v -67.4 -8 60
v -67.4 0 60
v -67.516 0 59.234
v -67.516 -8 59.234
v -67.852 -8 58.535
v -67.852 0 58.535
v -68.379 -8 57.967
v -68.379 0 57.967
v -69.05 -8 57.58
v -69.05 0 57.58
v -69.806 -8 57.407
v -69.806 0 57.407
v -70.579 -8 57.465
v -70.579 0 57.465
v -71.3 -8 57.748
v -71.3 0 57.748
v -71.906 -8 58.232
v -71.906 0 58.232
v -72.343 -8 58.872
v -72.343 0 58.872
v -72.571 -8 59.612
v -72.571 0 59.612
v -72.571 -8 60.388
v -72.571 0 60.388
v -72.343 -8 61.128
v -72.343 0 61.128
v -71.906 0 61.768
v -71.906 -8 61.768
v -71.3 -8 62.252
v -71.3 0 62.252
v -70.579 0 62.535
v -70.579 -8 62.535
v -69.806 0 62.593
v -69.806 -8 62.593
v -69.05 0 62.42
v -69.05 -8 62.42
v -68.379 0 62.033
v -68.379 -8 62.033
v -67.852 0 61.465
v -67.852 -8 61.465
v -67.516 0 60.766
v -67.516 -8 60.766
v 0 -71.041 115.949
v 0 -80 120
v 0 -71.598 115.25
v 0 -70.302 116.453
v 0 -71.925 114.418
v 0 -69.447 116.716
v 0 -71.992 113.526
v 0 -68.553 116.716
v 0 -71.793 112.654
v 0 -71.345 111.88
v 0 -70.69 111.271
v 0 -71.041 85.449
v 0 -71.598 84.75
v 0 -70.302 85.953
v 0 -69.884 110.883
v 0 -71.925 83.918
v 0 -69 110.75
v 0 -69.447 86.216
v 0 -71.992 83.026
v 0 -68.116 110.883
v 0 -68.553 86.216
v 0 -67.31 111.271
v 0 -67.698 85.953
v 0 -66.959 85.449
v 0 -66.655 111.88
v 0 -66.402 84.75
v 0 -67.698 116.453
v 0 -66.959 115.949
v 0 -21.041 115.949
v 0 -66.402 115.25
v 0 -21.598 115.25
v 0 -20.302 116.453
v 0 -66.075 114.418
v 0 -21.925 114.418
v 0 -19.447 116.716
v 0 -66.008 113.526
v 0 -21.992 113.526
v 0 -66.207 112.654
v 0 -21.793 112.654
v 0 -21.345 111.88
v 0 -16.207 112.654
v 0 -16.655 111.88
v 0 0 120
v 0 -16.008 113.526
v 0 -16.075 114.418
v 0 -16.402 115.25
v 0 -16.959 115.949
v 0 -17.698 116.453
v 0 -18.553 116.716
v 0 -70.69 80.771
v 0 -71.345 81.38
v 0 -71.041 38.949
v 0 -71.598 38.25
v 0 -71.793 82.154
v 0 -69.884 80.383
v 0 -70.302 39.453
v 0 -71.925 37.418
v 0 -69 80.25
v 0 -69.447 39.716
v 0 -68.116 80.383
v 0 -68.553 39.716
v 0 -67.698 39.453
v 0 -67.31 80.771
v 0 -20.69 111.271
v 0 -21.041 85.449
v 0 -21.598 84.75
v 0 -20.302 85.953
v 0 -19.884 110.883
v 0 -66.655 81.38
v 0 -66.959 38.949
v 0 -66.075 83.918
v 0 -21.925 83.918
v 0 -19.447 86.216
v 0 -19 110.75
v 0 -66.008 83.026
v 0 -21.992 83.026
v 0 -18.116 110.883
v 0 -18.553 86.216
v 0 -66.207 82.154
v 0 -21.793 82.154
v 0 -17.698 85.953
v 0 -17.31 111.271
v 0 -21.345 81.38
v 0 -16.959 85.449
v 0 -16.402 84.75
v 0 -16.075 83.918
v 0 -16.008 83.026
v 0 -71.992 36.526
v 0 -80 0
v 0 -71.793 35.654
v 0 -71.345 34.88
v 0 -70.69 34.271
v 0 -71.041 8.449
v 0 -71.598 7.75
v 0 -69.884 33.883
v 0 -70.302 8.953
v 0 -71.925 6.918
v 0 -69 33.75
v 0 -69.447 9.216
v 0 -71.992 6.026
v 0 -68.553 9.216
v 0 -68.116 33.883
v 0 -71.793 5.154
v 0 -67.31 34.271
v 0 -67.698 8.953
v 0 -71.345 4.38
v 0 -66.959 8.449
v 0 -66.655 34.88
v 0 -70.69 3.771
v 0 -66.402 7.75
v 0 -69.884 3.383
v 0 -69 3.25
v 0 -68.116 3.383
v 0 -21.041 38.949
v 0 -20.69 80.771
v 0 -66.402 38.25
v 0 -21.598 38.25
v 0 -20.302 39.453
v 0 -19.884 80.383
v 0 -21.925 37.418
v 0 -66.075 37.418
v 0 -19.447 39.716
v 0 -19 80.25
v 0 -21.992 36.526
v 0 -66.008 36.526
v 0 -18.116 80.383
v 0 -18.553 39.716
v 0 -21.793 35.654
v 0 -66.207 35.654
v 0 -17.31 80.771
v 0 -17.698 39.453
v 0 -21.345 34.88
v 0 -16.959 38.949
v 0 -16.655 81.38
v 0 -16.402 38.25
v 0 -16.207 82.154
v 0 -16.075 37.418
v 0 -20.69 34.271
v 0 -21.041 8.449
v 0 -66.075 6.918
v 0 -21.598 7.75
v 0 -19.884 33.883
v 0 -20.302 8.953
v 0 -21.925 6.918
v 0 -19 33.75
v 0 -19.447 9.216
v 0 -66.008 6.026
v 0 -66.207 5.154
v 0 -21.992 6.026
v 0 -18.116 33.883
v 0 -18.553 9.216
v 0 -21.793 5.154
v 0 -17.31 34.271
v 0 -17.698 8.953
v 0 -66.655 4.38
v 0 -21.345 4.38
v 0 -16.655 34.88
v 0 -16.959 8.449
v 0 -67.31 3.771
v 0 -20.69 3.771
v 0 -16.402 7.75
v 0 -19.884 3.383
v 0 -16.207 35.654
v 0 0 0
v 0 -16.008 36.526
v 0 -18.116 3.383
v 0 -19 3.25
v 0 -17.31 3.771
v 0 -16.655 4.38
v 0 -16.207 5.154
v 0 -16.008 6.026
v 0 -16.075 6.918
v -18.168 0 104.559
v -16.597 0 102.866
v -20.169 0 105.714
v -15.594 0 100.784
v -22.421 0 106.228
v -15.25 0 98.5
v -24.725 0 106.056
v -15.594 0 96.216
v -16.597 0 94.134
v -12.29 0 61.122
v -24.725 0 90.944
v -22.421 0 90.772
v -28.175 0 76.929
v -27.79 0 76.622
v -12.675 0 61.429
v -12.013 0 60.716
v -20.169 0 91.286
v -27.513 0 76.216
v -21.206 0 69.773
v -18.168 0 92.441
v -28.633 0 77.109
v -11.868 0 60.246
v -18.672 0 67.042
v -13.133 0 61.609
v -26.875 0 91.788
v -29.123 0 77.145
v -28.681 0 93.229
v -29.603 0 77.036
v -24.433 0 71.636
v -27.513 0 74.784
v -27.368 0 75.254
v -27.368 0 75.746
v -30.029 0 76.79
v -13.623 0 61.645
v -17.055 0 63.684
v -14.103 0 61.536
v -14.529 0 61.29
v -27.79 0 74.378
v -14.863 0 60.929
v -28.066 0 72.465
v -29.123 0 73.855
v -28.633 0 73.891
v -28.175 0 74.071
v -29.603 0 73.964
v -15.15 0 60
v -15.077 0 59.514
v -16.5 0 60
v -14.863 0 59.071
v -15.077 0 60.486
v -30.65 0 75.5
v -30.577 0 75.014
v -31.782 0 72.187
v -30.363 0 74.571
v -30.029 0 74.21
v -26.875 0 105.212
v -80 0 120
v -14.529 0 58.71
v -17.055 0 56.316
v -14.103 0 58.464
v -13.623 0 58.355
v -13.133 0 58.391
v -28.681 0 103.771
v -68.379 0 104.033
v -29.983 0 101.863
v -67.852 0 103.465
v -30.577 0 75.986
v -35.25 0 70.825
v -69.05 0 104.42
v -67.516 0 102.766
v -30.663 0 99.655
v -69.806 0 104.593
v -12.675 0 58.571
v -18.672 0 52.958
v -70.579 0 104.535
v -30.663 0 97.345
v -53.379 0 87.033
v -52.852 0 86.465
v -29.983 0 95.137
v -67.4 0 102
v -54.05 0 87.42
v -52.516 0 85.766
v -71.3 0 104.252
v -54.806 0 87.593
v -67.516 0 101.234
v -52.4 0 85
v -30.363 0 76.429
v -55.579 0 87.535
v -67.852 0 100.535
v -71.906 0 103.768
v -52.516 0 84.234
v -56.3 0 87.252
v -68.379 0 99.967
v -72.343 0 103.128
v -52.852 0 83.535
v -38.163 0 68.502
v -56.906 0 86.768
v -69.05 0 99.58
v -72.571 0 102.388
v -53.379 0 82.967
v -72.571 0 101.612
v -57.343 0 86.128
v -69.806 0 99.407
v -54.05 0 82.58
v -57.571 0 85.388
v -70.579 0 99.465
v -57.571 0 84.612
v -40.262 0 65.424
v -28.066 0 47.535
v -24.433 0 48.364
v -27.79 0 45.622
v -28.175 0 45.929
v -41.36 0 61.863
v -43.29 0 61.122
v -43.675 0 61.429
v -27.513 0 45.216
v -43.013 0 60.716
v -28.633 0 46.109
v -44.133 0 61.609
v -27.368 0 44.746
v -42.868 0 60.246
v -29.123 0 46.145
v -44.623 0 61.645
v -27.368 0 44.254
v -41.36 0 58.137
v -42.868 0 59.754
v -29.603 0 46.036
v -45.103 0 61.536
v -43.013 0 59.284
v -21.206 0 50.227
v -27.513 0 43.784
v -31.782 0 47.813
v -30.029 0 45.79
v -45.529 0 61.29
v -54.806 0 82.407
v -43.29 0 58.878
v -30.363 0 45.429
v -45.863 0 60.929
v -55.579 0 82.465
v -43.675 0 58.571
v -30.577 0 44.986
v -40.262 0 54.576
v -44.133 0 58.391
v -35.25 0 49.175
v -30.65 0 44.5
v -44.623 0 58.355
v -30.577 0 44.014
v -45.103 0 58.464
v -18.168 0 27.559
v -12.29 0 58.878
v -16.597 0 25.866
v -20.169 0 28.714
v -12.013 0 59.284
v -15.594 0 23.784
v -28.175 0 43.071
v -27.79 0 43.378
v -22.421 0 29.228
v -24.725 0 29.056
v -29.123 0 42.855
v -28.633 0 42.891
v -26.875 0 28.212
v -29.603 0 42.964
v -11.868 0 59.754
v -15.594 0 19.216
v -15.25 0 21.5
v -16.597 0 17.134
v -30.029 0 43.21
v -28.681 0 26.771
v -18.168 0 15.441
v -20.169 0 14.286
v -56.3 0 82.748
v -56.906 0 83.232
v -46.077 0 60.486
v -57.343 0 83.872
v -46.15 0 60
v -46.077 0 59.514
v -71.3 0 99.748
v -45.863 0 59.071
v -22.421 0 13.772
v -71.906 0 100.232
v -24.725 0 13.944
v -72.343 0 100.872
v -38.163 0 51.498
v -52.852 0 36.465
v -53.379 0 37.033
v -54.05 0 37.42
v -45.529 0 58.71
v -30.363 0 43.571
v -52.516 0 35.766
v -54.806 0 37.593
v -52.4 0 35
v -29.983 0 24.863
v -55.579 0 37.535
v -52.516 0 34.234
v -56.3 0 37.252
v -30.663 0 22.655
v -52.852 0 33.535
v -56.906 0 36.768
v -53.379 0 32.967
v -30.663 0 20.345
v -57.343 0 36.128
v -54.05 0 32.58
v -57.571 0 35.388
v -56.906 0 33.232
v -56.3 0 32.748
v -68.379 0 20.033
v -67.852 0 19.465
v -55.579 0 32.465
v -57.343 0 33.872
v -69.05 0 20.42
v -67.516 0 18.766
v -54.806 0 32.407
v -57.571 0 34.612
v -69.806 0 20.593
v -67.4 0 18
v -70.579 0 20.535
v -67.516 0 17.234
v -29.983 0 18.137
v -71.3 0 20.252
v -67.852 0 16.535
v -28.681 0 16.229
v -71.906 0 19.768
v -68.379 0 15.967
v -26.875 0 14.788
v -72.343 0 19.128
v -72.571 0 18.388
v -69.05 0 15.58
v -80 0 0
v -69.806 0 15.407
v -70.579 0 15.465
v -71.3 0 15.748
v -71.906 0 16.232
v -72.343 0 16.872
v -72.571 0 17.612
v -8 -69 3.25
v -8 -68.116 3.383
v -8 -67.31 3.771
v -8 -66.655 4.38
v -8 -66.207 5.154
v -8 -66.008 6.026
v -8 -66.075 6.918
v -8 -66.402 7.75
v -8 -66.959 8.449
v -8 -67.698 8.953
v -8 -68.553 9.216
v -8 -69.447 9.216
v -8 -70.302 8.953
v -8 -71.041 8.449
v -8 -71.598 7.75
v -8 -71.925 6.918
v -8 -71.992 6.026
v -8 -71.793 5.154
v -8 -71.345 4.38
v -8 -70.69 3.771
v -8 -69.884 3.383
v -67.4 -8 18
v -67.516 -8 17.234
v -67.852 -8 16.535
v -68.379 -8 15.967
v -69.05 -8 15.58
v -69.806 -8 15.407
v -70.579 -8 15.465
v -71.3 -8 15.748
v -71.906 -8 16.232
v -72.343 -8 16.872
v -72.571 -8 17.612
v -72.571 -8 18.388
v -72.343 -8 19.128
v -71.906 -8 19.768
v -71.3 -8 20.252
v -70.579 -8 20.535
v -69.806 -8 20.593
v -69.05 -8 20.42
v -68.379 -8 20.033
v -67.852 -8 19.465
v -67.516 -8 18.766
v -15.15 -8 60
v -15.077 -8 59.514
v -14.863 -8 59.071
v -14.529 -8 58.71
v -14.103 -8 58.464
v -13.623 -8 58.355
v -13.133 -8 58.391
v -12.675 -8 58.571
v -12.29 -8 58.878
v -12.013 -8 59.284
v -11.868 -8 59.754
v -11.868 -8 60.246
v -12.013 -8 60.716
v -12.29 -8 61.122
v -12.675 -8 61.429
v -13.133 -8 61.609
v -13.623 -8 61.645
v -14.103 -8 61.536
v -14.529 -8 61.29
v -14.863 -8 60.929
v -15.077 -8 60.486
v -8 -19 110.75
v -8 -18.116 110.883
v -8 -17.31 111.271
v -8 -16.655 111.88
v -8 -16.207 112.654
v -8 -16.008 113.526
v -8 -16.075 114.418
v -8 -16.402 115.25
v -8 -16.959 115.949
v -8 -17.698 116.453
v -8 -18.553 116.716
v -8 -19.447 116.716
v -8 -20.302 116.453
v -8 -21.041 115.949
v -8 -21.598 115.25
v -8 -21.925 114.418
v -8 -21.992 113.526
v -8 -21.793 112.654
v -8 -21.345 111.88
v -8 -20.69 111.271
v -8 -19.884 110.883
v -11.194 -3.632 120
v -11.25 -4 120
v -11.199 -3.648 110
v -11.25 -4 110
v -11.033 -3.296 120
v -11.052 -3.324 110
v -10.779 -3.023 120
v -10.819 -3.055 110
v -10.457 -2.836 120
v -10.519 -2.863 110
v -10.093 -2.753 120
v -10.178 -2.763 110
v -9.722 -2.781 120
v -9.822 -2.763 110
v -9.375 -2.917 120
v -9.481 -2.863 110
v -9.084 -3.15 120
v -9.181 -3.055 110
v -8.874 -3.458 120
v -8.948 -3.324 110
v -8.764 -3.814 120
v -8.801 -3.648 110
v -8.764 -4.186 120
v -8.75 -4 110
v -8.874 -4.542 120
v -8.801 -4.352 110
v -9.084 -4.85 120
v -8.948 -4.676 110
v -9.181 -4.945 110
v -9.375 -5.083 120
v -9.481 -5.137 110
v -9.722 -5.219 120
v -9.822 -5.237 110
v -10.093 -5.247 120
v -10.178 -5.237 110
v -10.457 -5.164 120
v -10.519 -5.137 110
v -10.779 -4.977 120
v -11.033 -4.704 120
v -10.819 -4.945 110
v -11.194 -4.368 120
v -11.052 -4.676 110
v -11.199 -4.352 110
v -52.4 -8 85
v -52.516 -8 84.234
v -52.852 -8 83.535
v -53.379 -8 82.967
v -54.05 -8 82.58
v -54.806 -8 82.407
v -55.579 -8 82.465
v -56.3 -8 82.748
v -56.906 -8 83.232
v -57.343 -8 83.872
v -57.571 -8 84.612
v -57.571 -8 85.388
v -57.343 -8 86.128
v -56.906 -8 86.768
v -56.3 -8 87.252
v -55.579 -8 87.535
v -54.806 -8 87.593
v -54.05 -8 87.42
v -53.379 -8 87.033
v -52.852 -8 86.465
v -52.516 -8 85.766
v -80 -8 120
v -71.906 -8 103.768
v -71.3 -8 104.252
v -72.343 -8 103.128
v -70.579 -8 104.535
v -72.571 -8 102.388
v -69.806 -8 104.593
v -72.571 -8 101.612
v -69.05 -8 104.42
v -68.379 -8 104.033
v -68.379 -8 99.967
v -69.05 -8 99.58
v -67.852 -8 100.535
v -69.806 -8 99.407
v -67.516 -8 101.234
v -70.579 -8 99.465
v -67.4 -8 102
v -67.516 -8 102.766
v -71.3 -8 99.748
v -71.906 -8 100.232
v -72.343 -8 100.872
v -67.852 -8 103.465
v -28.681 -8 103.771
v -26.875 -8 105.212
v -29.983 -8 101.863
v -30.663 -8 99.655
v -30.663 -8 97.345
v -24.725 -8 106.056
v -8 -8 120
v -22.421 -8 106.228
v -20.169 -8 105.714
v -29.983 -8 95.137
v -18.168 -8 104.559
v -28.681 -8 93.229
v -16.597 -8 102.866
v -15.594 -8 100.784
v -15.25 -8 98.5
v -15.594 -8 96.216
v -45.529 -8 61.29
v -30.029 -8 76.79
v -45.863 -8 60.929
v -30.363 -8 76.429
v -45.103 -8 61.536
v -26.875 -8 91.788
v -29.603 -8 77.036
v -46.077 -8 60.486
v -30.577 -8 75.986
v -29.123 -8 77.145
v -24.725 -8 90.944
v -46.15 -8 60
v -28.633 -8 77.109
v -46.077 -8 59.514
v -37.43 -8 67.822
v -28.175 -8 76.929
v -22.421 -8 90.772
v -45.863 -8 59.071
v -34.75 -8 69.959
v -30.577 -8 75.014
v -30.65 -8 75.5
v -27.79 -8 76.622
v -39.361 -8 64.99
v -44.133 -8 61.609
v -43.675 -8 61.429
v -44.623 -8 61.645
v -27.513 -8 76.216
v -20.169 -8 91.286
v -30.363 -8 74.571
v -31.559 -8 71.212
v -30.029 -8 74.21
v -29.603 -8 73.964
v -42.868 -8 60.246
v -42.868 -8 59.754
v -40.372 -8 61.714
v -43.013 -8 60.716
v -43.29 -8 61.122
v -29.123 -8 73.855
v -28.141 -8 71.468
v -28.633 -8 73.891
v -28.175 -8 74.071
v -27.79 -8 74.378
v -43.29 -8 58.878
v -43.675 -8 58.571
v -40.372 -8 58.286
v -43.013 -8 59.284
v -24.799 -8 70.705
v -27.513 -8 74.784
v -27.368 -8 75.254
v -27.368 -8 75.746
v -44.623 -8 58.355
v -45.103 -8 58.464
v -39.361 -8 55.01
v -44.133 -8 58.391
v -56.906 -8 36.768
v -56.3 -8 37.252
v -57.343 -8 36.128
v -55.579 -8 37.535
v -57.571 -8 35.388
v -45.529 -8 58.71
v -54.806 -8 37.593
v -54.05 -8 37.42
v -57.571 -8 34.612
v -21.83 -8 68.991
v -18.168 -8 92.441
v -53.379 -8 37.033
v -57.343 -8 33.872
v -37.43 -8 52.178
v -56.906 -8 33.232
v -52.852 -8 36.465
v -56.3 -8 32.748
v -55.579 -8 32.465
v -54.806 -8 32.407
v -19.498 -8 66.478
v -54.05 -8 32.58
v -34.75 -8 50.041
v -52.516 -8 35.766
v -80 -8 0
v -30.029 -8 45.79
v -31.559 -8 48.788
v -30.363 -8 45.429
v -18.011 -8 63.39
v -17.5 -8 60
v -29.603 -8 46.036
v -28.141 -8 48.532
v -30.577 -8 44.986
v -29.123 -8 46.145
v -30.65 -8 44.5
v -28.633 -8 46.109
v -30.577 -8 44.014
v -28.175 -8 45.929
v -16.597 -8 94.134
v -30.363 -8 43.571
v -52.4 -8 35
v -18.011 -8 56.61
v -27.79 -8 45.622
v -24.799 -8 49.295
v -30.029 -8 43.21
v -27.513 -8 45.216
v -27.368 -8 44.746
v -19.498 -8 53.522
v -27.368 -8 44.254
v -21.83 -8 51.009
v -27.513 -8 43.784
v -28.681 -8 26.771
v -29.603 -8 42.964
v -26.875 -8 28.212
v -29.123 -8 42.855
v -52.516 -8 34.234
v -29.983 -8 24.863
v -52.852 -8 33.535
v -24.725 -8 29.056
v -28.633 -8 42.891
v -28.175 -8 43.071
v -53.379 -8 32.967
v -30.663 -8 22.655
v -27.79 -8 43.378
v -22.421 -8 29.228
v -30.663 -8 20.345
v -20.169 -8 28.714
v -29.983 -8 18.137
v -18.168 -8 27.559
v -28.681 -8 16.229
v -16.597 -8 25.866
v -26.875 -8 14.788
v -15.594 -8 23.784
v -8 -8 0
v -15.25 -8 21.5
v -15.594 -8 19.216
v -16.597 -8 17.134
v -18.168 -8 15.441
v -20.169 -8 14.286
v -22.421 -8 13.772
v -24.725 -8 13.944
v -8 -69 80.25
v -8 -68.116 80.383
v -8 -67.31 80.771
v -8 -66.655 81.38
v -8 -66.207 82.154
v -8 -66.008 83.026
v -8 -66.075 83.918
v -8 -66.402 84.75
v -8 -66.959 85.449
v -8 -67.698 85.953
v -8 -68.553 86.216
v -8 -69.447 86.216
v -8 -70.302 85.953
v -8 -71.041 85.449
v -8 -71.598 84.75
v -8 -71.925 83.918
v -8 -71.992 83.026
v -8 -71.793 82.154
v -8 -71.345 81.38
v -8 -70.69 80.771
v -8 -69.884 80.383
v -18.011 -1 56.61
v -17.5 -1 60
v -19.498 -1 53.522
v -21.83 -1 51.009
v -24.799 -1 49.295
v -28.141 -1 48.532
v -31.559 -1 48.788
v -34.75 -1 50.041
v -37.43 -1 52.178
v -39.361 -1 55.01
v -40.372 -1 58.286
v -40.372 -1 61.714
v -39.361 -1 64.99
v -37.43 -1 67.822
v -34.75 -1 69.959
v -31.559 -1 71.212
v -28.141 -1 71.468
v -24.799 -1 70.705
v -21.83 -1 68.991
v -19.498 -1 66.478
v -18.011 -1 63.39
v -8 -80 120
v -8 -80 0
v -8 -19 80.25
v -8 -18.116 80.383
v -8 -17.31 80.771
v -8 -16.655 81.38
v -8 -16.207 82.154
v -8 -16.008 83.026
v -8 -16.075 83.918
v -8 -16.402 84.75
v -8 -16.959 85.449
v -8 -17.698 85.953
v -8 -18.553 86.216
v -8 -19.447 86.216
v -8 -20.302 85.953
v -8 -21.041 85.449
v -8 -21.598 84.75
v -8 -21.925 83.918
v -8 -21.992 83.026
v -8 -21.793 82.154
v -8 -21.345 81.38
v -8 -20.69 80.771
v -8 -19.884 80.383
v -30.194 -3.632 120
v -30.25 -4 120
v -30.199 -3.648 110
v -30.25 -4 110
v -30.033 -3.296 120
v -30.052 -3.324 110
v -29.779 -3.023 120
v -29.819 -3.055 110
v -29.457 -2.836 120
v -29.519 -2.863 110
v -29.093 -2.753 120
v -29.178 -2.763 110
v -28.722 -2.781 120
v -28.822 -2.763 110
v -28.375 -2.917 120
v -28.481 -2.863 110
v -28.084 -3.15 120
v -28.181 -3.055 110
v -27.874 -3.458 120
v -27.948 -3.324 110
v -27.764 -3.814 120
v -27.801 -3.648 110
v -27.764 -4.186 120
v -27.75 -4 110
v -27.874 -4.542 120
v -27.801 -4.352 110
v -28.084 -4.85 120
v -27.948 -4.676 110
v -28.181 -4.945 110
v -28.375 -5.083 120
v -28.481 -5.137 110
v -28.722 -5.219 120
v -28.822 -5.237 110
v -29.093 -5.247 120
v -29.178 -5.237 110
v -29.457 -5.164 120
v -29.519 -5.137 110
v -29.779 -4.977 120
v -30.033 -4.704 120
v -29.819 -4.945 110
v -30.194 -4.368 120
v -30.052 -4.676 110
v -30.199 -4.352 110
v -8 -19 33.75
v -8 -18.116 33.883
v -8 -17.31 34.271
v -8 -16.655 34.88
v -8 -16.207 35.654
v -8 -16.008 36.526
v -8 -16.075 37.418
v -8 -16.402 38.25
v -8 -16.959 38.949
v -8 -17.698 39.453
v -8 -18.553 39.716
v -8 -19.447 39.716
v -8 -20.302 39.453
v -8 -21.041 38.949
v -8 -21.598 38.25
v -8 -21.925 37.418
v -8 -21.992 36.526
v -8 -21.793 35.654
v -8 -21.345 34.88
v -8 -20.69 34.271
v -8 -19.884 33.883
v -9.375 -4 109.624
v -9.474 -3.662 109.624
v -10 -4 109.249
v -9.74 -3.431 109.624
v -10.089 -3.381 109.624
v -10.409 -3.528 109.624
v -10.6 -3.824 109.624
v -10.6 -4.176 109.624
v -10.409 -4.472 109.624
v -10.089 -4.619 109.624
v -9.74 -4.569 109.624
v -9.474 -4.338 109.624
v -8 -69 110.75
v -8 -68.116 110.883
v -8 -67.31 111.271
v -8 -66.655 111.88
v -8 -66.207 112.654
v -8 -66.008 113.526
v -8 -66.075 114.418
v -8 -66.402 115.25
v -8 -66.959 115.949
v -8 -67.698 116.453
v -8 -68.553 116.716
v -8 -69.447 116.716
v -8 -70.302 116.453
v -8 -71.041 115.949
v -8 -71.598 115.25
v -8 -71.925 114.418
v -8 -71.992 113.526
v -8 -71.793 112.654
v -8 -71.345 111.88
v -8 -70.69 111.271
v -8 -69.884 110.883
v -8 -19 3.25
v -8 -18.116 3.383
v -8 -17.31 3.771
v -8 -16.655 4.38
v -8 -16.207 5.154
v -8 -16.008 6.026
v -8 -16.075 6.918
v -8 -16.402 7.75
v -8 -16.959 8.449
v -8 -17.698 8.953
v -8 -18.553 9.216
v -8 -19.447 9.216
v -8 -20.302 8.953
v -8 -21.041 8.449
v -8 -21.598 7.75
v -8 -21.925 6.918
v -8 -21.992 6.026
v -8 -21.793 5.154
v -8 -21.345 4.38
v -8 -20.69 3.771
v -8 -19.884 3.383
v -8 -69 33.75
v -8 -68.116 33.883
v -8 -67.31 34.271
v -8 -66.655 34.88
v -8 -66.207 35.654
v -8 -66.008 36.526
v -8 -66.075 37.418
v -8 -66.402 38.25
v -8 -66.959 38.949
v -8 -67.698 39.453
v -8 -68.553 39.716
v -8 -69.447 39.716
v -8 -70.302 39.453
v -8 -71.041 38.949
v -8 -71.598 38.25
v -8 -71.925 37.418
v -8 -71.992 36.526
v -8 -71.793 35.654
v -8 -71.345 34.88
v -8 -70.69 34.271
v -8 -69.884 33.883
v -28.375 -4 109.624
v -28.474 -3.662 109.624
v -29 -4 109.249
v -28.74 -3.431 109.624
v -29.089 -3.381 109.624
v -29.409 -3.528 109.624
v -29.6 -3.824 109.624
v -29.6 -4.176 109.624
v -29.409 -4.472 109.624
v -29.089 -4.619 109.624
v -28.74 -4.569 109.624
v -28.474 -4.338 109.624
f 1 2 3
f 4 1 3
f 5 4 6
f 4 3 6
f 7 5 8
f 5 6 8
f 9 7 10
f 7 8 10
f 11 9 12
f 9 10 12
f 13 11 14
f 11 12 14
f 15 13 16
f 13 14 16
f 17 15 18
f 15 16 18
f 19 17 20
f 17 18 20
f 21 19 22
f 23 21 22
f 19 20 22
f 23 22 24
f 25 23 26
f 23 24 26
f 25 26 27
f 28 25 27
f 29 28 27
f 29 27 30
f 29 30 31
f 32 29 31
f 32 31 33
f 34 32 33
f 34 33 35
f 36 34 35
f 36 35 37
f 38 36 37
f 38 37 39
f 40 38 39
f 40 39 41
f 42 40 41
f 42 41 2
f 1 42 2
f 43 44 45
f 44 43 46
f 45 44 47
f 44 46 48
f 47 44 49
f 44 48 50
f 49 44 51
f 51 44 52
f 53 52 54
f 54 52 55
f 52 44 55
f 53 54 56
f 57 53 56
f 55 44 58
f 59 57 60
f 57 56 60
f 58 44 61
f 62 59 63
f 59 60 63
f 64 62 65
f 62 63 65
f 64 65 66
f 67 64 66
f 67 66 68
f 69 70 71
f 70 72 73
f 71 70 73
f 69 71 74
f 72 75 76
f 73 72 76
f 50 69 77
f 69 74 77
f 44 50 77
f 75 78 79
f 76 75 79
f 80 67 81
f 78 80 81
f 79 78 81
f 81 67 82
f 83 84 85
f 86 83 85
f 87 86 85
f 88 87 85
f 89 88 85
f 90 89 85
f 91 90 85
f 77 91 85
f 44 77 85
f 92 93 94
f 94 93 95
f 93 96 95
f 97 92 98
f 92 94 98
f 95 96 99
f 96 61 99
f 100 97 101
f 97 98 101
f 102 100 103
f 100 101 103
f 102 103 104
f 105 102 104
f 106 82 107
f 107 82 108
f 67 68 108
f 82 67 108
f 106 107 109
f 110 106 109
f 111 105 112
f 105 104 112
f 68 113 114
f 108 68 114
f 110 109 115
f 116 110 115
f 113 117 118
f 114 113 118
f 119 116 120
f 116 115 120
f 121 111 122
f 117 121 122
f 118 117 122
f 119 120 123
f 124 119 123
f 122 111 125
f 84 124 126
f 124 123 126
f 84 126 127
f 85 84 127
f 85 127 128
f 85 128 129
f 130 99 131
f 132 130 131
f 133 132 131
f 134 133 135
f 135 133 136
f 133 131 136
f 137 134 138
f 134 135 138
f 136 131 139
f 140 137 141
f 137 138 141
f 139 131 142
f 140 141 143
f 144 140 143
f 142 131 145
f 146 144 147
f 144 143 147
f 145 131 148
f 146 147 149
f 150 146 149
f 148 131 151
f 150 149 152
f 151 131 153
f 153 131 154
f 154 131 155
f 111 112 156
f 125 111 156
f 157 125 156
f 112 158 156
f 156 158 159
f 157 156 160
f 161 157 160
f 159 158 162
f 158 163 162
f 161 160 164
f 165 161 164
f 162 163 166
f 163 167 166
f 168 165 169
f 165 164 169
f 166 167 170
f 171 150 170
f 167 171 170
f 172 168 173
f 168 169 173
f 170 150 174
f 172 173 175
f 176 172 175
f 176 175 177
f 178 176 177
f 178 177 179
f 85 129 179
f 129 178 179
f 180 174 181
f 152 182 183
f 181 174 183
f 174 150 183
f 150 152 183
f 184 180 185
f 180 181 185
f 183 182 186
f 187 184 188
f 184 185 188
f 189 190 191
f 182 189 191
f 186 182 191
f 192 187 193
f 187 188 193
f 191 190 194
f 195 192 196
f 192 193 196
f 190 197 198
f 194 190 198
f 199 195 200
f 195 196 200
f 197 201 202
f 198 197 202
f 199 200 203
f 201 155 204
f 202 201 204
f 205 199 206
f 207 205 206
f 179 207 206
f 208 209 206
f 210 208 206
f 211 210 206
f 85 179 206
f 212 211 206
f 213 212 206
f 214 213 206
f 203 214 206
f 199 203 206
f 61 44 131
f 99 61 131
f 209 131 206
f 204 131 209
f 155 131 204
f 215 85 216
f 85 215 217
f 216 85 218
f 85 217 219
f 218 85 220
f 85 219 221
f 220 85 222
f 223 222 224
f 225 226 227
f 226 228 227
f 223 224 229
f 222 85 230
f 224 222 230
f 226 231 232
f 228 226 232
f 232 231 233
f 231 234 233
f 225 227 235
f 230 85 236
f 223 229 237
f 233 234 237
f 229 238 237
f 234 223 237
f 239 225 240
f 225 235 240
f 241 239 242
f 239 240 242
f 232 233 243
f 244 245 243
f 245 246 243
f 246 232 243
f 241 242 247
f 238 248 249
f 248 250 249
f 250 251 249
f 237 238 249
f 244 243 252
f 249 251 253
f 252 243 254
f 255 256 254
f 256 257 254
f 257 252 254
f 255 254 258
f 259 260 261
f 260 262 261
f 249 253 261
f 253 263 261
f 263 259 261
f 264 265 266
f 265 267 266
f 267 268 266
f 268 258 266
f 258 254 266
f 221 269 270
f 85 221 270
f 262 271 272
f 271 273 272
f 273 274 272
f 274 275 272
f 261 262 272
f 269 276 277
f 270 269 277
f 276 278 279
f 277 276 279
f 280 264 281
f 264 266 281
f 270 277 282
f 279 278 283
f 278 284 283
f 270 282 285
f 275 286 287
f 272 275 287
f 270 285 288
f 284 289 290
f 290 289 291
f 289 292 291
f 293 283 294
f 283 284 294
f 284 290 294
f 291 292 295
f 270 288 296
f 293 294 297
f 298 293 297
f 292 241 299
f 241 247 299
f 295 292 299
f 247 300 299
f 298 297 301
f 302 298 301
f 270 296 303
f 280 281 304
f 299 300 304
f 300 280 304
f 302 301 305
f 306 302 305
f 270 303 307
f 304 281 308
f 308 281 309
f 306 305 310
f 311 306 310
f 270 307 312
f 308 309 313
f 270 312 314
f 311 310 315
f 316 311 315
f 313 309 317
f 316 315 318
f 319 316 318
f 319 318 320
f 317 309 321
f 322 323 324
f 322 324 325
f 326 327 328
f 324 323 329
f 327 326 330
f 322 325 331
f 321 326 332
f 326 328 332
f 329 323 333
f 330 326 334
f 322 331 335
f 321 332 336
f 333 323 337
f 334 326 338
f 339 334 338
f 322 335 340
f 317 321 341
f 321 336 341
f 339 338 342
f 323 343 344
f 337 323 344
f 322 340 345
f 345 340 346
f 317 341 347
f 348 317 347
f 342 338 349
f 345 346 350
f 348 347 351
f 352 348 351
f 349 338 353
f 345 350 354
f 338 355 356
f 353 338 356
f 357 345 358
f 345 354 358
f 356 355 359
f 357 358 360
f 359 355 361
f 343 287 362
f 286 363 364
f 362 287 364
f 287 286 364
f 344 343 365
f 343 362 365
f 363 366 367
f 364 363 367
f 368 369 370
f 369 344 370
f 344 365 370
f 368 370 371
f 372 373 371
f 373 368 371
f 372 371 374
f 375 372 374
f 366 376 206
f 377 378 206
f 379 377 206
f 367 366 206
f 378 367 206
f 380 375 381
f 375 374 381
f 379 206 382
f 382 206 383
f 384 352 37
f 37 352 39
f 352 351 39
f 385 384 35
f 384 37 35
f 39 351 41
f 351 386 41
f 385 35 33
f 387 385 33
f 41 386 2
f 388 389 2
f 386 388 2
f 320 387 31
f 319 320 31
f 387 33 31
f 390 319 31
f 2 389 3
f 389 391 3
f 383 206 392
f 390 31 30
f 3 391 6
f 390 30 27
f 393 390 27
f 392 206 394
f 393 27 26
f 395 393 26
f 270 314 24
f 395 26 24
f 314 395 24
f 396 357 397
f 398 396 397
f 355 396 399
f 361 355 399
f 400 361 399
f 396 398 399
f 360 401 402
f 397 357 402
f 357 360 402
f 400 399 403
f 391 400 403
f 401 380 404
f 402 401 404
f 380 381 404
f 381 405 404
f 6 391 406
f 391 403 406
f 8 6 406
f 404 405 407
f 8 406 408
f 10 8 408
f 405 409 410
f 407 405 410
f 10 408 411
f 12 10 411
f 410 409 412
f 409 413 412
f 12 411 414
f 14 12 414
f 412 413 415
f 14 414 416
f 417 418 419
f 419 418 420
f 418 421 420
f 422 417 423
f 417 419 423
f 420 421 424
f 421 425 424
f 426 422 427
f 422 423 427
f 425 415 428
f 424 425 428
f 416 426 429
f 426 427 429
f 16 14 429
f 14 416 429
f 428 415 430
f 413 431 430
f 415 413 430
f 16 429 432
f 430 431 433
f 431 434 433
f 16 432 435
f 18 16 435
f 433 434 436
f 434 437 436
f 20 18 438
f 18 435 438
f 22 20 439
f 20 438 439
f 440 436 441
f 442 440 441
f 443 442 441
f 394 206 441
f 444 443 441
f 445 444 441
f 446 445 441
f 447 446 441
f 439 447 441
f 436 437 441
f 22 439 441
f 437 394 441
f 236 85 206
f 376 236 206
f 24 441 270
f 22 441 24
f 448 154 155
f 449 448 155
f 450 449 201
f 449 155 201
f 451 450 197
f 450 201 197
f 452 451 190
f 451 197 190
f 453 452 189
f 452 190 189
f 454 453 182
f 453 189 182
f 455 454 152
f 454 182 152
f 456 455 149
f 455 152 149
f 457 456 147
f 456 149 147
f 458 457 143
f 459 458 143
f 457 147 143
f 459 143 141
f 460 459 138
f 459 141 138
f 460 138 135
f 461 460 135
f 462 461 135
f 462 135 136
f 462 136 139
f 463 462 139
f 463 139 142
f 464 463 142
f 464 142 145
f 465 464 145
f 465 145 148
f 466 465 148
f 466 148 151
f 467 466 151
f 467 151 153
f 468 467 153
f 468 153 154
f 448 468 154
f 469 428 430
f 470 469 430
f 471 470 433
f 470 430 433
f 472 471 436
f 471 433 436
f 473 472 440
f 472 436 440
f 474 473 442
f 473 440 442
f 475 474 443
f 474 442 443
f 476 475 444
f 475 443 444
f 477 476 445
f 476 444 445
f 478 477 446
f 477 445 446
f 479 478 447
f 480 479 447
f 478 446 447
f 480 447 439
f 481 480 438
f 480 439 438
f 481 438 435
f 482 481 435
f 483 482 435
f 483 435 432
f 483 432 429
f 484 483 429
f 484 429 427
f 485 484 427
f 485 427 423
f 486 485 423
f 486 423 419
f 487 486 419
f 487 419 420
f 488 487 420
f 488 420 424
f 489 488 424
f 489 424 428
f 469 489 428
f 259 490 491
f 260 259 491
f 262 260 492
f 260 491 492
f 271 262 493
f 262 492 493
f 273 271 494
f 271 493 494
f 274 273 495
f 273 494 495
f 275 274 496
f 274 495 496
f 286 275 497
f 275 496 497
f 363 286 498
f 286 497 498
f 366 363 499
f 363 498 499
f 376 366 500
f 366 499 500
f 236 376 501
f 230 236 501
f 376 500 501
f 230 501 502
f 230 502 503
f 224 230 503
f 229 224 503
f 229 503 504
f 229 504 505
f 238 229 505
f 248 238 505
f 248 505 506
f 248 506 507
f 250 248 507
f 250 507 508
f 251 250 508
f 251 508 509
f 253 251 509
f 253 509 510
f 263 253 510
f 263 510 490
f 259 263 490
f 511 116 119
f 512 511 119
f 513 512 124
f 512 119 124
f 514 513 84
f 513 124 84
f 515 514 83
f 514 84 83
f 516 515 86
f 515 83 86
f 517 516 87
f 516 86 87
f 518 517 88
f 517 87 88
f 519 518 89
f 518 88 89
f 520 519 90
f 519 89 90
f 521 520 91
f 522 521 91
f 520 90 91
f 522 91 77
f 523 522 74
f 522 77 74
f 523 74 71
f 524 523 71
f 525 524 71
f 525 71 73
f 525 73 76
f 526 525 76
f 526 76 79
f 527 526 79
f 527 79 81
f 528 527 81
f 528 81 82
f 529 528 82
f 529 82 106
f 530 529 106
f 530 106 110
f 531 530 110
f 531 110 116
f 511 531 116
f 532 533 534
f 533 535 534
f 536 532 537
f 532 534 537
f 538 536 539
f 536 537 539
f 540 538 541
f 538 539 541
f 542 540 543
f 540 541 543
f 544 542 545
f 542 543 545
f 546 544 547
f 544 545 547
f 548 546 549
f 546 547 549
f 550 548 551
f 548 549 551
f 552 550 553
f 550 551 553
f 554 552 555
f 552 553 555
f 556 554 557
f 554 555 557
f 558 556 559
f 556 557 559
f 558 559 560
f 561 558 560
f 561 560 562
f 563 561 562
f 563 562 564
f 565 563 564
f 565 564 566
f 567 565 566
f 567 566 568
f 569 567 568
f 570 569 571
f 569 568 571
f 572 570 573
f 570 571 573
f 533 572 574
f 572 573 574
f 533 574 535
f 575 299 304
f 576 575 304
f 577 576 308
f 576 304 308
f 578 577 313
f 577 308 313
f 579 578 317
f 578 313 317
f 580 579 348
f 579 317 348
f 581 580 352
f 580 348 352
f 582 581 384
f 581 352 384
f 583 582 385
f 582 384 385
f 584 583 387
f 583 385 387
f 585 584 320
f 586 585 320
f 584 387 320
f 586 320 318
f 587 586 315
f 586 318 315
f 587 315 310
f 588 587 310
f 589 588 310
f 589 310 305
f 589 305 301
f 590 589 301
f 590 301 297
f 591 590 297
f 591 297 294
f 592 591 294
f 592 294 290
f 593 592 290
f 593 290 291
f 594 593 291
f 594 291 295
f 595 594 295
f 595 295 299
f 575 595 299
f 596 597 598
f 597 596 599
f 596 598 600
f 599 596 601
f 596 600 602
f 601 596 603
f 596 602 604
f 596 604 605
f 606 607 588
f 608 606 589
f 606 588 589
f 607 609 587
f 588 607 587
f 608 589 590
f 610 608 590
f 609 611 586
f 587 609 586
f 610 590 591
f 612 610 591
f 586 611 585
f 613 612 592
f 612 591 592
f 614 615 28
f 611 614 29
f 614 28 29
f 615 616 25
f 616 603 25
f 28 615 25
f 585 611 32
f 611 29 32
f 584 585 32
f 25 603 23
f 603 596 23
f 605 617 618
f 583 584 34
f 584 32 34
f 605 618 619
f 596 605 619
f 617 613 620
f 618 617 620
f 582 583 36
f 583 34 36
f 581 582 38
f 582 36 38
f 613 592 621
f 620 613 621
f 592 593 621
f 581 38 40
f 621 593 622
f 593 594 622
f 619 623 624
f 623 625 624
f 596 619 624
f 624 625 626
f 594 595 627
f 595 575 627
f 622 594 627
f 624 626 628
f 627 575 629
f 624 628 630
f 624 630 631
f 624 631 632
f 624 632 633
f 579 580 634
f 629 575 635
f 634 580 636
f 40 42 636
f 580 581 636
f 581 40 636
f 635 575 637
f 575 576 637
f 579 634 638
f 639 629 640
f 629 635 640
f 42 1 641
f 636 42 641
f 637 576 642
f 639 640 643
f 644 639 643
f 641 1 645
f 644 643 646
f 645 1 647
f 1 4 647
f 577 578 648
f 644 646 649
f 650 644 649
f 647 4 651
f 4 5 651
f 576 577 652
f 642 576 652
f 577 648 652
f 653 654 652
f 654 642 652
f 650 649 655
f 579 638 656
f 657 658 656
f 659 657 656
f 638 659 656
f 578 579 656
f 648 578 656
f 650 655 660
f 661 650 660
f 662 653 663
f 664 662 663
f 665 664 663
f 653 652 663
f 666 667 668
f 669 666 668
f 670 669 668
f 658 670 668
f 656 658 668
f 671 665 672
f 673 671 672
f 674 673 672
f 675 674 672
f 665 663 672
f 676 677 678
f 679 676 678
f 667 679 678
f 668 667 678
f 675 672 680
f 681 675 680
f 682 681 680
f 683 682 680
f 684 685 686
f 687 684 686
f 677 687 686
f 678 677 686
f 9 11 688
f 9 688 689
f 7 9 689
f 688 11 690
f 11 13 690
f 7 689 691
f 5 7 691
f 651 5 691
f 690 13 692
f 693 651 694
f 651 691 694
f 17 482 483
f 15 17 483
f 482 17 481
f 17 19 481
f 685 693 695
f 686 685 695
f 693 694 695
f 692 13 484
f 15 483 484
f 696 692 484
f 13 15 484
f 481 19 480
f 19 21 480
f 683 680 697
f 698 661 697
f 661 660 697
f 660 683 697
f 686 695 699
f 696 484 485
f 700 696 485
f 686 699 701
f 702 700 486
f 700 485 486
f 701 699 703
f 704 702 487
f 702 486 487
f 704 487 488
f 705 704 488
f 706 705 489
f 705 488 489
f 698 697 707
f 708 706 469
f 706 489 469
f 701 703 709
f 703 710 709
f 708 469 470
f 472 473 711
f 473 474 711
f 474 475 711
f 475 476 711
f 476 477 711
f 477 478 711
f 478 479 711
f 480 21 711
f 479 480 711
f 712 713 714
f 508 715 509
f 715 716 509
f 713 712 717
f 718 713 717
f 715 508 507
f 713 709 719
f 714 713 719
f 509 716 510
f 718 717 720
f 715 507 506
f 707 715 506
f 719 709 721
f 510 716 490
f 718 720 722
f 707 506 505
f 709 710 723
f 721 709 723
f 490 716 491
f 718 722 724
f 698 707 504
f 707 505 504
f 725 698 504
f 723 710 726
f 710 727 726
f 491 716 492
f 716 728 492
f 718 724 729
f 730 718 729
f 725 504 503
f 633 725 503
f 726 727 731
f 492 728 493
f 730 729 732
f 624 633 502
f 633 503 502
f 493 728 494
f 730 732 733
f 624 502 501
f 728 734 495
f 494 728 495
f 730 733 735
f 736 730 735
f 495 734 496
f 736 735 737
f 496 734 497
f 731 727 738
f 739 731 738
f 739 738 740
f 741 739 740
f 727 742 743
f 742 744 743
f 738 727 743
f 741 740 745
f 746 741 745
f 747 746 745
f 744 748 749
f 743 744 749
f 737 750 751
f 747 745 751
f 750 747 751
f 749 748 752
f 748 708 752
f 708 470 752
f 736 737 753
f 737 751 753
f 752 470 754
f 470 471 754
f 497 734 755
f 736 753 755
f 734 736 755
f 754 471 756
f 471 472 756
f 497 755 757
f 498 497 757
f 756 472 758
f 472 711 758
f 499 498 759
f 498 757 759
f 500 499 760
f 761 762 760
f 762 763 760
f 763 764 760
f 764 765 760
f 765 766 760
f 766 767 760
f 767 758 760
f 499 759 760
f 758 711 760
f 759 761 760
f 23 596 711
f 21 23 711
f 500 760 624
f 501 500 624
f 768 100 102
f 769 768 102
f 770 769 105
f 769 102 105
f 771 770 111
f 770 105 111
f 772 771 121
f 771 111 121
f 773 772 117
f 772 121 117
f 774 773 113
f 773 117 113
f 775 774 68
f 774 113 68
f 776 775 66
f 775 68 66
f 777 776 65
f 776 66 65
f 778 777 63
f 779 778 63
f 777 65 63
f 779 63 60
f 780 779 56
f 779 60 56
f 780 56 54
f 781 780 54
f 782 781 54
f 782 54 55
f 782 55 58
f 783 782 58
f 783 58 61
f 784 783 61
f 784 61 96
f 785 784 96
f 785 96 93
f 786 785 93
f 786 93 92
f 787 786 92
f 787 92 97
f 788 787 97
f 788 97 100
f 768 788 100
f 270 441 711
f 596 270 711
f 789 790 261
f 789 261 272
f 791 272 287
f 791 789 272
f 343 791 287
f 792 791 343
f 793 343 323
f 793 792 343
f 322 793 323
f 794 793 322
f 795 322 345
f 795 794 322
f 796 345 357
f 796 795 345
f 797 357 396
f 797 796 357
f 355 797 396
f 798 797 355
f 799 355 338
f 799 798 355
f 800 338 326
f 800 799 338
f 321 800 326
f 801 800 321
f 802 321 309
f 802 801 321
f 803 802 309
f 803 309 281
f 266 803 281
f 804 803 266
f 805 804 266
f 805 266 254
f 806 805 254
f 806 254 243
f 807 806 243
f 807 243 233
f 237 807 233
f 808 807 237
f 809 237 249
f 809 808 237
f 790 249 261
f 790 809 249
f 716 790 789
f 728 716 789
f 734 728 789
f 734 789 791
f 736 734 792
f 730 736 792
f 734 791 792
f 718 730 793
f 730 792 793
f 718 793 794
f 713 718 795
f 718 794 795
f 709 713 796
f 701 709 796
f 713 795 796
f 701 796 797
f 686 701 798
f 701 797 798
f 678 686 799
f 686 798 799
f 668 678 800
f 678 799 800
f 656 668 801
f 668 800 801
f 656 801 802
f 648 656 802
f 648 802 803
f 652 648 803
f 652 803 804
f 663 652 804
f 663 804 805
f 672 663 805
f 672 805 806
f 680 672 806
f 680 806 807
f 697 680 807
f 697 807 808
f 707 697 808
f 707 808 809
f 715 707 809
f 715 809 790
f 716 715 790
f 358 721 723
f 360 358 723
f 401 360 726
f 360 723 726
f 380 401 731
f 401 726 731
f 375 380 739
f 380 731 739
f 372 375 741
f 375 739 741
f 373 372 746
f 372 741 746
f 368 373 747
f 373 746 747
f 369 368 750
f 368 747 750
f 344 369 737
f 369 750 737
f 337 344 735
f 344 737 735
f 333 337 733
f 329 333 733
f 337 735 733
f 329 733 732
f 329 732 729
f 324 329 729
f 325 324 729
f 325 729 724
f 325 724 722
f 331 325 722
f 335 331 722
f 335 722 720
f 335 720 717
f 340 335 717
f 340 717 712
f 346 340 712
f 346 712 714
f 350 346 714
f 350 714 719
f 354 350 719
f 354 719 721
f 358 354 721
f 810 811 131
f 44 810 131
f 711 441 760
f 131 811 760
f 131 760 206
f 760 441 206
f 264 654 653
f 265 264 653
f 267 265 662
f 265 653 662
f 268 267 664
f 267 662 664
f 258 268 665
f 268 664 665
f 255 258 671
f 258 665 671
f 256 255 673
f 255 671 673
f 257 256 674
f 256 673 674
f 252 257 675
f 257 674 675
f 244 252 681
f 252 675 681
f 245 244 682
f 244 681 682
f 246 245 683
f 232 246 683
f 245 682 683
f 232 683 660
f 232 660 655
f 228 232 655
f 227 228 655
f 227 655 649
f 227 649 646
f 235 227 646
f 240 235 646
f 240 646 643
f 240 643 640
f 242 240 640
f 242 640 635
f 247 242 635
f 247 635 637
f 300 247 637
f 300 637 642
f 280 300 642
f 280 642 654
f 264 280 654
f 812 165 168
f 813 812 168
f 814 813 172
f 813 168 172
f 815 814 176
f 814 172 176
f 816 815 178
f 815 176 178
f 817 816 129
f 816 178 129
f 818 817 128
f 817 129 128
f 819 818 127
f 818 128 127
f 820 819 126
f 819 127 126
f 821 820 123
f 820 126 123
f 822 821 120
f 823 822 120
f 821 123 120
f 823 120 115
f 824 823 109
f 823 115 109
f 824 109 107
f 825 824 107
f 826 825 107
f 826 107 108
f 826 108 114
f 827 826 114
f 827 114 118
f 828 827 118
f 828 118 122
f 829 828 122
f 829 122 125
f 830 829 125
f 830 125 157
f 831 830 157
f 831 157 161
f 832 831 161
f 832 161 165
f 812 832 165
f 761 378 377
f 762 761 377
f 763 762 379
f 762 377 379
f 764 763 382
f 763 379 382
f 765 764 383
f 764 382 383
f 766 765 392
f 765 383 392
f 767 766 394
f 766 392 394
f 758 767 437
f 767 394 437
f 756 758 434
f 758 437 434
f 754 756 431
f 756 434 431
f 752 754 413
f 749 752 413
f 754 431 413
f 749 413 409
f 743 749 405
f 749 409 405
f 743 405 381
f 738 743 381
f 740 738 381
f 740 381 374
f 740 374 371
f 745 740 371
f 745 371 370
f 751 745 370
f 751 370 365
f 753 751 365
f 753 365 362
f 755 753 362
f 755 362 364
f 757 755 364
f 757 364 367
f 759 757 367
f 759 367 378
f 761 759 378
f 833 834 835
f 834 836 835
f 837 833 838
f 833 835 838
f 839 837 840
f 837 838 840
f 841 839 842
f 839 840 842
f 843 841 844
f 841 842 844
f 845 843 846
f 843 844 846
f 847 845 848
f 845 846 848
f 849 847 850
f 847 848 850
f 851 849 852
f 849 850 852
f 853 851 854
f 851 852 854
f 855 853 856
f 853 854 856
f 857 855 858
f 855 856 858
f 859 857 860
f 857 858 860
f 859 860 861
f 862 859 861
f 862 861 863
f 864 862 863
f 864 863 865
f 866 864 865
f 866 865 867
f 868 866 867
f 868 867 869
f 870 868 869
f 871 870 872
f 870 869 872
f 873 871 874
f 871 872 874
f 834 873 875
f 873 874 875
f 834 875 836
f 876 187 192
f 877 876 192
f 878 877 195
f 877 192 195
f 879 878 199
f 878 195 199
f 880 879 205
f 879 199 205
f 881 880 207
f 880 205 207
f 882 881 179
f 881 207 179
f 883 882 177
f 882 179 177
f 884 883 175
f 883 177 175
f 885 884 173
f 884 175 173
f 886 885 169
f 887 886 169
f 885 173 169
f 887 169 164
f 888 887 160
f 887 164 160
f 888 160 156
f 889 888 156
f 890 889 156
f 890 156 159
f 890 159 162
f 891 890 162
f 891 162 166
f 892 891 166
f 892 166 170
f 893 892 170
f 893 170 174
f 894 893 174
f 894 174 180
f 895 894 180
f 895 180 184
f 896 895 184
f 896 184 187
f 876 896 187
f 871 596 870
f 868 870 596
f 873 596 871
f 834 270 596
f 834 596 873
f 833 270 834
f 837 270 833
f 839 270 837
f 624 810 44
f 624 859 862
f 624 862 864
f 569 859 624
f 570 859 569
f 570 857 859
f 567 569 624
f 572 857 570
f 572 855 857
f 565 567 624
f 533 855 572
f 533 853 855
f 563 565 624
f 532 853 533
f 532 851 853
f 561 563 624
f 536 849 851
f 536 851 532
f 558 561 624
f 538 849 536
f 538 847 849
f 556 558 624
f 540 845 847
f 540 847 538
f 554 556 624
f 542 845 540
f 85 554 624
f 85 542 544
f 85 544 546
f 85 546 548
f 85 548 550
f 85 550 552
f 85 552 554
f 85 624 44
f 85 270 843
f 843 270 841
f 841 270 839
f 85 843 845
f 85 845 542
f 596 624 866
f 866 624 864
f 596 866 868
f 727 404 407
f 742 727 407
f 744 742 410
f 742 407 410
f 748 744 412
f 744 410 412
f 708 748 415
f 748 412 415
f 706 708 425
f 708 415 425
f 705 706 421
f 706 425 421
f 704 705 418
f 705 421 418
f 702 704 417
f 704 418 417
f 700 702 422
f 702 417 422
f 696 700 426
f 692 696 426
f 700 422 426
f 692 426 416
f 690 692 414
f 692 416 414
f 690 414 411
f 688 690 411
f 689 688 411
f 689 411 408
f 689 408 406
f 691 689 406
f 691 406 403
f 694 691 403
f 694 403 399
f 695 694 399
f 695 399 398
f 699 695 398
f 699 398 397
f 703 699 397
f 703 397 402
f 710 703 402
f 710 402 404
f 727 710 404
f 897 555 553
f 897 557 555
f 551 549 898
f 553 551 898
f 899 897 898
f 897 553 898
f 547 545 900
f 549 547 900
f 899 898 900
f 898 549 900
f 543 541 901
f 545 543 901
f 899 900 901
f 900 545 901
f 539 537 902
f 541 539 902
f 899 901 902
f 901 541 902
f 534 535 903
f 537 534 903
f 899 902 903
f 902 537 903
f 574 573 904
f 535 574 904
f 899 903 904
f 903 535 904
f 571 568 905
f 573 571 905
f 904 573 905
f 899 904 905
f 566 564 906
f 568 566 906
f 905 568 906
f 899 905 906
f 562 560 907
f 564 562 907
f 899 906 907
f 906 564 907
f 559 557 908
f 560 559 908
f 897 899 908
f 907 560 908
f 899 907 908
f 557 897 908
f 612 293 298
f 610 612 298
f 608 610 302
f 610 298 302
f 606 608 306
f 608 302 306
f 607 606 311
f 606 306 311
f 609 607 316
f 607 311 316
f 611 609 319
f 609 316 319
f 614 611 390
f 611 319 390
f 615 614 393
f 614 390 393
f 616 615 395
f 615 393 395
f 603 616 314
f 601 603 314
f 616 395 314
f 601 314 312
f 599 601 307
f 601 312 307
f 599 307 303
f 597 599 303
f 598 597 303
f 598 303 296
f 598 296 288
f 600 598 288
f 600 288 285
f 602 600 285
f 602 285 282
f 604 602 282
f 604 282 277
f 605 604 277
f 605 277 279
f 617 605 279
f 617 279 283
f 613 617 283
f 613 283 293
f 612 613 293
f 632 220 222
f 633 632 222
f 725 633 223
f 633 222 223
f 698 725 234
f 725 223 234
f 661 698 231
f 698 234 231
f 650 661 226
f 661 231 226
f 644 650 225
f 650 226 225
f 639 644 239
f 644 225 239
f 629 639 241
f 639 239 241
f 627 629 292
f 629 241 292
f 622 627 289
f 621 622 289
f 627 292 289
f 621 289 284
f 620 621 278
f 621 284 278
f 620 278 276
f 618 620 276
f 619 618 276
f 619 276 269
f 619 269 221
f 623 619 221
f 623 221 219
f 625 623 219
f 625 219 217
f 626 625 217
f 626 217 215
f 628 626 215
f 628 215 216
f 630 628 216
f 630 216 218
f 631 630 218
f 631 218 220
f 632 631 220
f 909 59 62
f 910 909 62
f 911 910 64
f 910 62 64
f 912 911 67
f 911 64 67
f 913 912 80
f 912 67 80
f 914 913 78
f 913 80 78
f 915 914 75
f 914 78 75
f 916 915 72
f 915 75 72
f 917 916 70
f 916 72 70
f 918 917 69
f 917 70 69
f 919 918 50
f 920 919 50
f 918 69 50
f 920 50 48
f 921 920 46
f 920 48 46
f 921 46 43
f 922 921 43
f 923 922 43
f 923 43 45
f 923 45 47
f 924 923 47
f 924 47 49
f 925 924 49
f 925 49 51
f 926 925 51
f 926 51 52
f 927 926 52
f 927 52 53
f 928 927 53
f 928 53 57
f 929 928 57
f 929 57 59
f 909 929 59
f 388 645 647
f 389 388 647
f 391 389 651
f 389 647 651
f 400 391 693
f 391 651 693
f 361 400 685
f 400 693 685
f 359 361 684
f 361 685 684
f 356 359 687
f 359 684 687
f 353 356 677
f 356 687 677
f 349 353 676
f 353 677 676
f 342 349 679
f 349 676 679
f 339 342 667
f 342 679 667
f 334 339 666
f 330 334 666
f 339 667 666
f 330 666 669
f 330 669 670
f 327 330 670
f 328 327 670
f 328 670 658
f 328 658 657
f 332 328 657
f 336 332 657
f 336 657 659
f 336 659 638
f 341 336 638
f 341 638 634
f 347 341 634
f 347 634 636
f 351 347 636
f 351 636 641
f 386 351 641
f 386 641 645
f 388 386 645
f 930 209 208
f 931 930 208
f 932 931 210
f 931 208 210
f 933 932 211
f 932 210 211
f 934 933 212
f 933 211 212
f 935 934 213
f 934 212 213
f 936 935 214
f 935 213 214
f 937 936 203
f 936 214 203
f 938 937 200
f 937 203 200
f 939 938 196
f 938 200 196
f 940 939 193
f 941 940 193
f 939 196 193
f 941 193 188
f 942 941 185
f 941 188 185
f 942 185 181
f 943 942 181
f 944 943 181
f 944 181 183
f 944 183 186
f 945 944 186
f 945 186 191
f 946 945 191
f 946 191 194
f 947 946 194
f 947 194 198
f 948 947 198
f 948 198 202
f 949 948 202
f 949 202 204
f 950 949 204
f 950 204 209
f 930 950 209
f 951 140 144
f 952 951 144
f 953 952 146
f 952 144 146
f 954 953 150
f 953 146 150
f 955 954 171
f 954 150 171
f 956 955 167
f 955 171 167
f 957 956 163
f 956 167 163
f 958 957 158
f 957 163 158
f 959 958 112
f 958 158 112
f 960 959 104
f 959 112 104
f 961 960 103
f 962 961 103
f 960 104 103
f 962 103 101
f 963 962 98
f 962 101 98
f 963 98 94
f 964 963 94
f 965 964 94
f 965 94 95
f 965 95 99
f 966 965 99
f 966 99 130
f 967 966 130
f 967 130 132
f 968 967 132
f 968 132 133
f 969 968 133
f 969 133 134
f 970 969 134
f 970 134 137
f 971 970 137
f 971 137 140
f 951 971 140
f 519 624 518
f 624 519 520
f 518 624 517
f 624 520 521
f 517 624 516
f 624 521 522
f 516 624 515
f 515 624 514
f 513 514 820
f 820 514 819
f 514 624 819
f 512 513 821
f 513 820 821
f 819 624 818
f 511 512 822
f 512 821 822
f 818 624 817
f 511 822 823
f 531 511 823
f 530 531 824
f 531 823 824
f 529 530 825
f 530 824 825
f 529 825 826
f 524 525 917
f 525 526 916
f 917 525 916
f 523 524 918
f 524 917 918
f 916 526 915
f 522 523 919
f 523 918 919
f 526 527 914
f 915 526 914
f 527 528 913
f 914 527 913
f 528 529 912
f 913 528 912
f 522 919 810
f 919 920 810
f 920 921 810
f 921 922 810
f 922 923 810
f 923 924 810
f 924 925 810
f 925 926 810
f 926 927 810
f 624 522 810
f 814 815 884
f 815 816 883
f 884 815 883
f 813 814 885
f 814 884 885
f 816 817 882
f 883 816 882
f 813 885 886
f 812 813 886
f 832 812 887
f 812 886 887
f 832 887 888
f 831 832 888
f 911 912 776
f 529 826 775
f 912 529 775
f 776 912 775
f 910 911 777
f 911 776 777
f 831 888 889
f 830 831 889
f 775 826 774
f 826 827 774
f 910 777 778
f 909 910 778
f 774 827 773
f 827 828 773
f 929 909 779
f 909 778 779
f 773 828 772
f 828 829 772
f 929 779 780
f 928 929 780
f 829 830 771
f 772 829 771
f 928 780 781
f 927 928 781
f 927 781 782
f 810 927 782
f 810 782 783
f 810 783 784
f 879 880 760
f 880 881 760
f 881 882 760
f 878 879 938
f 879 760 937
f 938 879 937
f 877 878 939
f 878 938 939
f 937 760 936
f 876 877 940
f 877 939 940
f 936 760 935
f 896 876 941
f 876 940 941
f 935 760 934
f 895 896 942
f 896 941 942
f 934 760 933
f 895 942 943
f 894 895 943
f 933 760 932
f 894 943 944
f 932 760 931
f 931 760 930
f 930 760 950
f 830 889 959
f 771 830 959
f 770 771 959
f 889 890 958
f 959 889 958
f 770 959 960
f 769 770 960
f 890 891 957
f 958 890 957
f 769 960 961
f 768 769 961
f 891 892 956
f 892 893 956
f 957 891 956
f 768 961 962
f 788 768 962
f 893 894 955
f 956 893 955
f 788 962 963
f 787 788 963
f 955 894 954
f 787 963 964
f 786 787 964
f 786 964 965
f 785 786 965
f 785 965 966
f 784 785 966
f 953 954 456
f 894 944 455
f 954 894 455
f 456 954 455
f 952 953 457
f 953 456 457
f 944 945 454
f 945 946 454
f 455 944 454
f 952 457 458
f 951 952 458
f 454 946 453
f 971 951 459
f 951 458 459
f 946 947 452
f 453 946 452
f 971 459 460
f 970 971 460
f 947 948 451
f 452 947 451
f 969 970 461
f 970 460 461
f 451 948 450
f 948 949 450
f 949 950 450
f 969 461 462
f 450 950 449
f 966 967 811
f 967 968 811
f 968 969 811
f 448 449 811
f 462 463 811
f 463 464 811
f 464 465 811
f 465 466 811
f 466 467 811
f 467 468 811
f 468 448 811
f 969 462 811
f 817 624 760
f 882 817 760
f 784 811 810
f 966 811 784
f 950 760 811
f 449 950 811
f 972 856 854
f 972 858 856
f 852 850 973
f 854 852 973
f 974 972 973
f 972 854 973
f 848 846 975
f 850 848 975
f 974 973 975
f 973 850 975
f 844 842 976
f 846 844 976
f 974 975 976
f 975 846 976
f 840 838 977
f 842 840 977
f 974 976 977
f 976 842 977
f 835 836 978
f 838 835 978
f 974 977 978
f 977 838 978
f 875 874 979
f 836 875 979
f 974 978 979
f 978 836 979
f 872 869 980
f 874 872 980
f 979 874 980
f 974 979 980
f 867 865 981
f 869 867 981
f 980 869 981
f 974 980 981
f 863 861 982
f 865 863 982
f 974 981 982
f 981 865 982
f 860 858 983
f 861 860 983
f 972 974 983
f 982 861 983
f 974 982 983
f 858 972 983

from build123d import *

# Parameters (mm, degrees)
ESTRUSIONE_ESTRUSIONE1_DEPTH = 120
TAGLIO_ESTRUSIONE2_REACH     = 82
SCHIZZO6_R                   = 7.75
TAGLIO_ESTRUSIONE3_REACH     = 82
SCHIZZO7_R                   = 11.5
M4_TAPPED_HOLE1_D            = 3.3
SCHIZZO12_R                  = 3
TAGLIO_ESTRUSIONE4_DEPTH     = 10
SCHIZZO14_R                  = 2.6
TAGLIO_ESTRUSIONE5_DEPTH     = 10
SMUSSO2_SIZE                 = 1
FORO_FILETTATO_M3_1_D        = 2.5
FORO_FILETTATO_M3_1_DEPTH    = 10
FORO_FILETTATO_M3_1_TIP      = 0.751075774


with BuildPart() as part:
    # Schizzo1 → Estrusione-Estrusione1 (new body)
    with BuildSketch(Plane.XY):
        Polygon((0, 0), (-80, 0), (-80, -8), (-8, -8), (-8, -80), (0, -80), align=None)
    extrude(amount=ESTRUSIONE_ESTRUSIONE1_DEPTH)

    # Schizzo6 → Taglio-Estrusione2 (cut, up to next)
    with BuildSketch(Plane(origin=(0, 0, 0), x_dir=(1, 0, 0), z_dir=(0, 1, 0)), mode=Mode.PRIVATE) as taglio_estrusione2_sk1:
        with Locations((-23, -21.5)):
            Circle(SCHIZZO6_R)
    taglio_estrusione2_tool1 = extrude(taglio_estrusione2_sk1.sketch, amount=-TAGLIO_ESTRUSIONE2_REACH, mode=Mode.PRIVATE) & part.part
    add(taglio_estrusione2_tool1.solids().sort_by_distance((-23, 0, 21.5))[0], mode=Mode.SUBTRACT)
    # Schizzo6 → Taglio-Estrusione2 (cut, up to next)
    with BuildSketch(Plane(origin=(0, 0, 0), x_dir=(1, 0, 0), z_dir=(0, 1, 0)), mode=Mode.PRIVATE) as taglio_estrusione2_sk2:
        with Locations((-23, -98.5)):
            Circle(SCHIZZO6_R)
    taglio_estrusione2_tool2 = extrude(taglio_estrusione2_sk2.sketch, amount=-TAGLIO_ESTRUSIONE2_REACH, mode=Mode.PRIVATE) & part.part
    add(taglio_estrusione2_tool2.solids().sort_by_distance((-23, 0, 98.5))[0], mode=Mode.SUBTRACT)

    # Schizzo7 → Taglio-Estrusione3 (cut, up to next)
    with BuildSketch(Plane(origin=(0, 0, 0), x_dir=(1, 0, 0), z_dir=(0, 1, 0)), mode=Mode.PRIVATE) as taglio_estrusione3_sk1:
        with Locations((-29, -60)):
            Circle(SCHIZZO7_R)
    taglio_estrusione3_tool1 = extrude(taglio_estrusione3_sk1.sketch, amount=-TAGLIO_ESTRUSIONE3_REACH, mode=Mode.PRIVATE) & part.part
    add(taglio_estrusione3_tool1.solids().sort_by_distance((-29, 0, 60))[0], mode=Mode.SUBTRACT)

    # M4 Tapped Hole1 (through all)
    with Locations(Plane(origin=(0, 0, 0), x_dir=(1, 0, 0), z_dir=(0, 1, 0))):
        with Locations((-29, -44.5), (-44.5, -60), (-29, -75.5), (-13.5, -60), (-29, -60)):
            Hole(M4_TAPPED_HOLE1_D / 2)

    # Schizzo12 → Taglio-Estrusione4 (cut)
    with BuildSketch(Plane(origin=(0, 0, 0), x_dir=(0, 0, -1), z_dir=(1, 0, 0))):
        with Locations((-113.75, -19)):
            Circle(SCHIZZO12_R)
        with Locations((-83.25, -19)):
            Circle(SCHIZZO12_R)
        with Locations((-36.75, -19)):
            Circle(SCHIZZO12_R)
        with Locations((-6.25, -19)):
            Circle(SCHIZZO12_R)
        with Locations((-83.25, -69)):
            Circle(SCHIZZO12_R)
        with Locations((-113.75, -69)):
            Circle(SCHIZZO12_R)
        with Locations((-6.25, -69)):
            Circle(SCHIZZO12_R)
        with Locations((-36.75, -69)):
            Circle(SCHIZZO12_R)
    extrude(amount=-TAGLIO_ESTRUSIONE4_DEPTH, mode=Mode.SUBTRACT)

    # Schizzo14 → Taglio-Estrusione5 (cut)
    with BuildSketch(Plane(origin=(0, 0, 0), x_dir=(1, 0, 0), z_dir=(0, 1, 0))):
        with Locations((-70, -18)):
            Circle(SCHIZZO14_R)
        with Locations((-70, -60)):
            Circle(SCHIZZO14_R)
        with Locations((-70, -102)):
            Circle(SCHIZZO14_R)
        with Locations((-55, -35)):
            Circle(SCHIZZO14_R)
        with Locations((-55, -85)):
            Circle(SCHIZZO14_R)
    extrude(amount=-TAGLIO_ESTRUSIONE5_DEPTH, mode=Mode.SUBTRACT)

    # Smusso2
    smusso2_edges = [part.edges().sort_by_distance(p)[0] for p in [
        (-40.5, 0, 60),
    ]]
    chamfer(smusso2_edges, length=SMUSSO2_SIZE)

    # Foro filettato M3-1
    with Locations(Plane.XY.offset(120)):
        with Locations((-10, -4), (-29, -4)):
            Hole(FORO_FILETTATO_M3_1_D / 2, depth=FORO_FILETTATO_M3_1_DEPTH)
            with Locations((0, 0, -(FORO_FILETTATO_M3_1_DEPTH + FORO_FILETTATO_M3_1_TIP / 2))):  # 118° drill point
                Cone(0, FORO_FILETTATO_M3_1_D / 2, FORO_FILETTATO_M3_1_TIP, mode=Mode.SUBTRACT)


solid = part.part
